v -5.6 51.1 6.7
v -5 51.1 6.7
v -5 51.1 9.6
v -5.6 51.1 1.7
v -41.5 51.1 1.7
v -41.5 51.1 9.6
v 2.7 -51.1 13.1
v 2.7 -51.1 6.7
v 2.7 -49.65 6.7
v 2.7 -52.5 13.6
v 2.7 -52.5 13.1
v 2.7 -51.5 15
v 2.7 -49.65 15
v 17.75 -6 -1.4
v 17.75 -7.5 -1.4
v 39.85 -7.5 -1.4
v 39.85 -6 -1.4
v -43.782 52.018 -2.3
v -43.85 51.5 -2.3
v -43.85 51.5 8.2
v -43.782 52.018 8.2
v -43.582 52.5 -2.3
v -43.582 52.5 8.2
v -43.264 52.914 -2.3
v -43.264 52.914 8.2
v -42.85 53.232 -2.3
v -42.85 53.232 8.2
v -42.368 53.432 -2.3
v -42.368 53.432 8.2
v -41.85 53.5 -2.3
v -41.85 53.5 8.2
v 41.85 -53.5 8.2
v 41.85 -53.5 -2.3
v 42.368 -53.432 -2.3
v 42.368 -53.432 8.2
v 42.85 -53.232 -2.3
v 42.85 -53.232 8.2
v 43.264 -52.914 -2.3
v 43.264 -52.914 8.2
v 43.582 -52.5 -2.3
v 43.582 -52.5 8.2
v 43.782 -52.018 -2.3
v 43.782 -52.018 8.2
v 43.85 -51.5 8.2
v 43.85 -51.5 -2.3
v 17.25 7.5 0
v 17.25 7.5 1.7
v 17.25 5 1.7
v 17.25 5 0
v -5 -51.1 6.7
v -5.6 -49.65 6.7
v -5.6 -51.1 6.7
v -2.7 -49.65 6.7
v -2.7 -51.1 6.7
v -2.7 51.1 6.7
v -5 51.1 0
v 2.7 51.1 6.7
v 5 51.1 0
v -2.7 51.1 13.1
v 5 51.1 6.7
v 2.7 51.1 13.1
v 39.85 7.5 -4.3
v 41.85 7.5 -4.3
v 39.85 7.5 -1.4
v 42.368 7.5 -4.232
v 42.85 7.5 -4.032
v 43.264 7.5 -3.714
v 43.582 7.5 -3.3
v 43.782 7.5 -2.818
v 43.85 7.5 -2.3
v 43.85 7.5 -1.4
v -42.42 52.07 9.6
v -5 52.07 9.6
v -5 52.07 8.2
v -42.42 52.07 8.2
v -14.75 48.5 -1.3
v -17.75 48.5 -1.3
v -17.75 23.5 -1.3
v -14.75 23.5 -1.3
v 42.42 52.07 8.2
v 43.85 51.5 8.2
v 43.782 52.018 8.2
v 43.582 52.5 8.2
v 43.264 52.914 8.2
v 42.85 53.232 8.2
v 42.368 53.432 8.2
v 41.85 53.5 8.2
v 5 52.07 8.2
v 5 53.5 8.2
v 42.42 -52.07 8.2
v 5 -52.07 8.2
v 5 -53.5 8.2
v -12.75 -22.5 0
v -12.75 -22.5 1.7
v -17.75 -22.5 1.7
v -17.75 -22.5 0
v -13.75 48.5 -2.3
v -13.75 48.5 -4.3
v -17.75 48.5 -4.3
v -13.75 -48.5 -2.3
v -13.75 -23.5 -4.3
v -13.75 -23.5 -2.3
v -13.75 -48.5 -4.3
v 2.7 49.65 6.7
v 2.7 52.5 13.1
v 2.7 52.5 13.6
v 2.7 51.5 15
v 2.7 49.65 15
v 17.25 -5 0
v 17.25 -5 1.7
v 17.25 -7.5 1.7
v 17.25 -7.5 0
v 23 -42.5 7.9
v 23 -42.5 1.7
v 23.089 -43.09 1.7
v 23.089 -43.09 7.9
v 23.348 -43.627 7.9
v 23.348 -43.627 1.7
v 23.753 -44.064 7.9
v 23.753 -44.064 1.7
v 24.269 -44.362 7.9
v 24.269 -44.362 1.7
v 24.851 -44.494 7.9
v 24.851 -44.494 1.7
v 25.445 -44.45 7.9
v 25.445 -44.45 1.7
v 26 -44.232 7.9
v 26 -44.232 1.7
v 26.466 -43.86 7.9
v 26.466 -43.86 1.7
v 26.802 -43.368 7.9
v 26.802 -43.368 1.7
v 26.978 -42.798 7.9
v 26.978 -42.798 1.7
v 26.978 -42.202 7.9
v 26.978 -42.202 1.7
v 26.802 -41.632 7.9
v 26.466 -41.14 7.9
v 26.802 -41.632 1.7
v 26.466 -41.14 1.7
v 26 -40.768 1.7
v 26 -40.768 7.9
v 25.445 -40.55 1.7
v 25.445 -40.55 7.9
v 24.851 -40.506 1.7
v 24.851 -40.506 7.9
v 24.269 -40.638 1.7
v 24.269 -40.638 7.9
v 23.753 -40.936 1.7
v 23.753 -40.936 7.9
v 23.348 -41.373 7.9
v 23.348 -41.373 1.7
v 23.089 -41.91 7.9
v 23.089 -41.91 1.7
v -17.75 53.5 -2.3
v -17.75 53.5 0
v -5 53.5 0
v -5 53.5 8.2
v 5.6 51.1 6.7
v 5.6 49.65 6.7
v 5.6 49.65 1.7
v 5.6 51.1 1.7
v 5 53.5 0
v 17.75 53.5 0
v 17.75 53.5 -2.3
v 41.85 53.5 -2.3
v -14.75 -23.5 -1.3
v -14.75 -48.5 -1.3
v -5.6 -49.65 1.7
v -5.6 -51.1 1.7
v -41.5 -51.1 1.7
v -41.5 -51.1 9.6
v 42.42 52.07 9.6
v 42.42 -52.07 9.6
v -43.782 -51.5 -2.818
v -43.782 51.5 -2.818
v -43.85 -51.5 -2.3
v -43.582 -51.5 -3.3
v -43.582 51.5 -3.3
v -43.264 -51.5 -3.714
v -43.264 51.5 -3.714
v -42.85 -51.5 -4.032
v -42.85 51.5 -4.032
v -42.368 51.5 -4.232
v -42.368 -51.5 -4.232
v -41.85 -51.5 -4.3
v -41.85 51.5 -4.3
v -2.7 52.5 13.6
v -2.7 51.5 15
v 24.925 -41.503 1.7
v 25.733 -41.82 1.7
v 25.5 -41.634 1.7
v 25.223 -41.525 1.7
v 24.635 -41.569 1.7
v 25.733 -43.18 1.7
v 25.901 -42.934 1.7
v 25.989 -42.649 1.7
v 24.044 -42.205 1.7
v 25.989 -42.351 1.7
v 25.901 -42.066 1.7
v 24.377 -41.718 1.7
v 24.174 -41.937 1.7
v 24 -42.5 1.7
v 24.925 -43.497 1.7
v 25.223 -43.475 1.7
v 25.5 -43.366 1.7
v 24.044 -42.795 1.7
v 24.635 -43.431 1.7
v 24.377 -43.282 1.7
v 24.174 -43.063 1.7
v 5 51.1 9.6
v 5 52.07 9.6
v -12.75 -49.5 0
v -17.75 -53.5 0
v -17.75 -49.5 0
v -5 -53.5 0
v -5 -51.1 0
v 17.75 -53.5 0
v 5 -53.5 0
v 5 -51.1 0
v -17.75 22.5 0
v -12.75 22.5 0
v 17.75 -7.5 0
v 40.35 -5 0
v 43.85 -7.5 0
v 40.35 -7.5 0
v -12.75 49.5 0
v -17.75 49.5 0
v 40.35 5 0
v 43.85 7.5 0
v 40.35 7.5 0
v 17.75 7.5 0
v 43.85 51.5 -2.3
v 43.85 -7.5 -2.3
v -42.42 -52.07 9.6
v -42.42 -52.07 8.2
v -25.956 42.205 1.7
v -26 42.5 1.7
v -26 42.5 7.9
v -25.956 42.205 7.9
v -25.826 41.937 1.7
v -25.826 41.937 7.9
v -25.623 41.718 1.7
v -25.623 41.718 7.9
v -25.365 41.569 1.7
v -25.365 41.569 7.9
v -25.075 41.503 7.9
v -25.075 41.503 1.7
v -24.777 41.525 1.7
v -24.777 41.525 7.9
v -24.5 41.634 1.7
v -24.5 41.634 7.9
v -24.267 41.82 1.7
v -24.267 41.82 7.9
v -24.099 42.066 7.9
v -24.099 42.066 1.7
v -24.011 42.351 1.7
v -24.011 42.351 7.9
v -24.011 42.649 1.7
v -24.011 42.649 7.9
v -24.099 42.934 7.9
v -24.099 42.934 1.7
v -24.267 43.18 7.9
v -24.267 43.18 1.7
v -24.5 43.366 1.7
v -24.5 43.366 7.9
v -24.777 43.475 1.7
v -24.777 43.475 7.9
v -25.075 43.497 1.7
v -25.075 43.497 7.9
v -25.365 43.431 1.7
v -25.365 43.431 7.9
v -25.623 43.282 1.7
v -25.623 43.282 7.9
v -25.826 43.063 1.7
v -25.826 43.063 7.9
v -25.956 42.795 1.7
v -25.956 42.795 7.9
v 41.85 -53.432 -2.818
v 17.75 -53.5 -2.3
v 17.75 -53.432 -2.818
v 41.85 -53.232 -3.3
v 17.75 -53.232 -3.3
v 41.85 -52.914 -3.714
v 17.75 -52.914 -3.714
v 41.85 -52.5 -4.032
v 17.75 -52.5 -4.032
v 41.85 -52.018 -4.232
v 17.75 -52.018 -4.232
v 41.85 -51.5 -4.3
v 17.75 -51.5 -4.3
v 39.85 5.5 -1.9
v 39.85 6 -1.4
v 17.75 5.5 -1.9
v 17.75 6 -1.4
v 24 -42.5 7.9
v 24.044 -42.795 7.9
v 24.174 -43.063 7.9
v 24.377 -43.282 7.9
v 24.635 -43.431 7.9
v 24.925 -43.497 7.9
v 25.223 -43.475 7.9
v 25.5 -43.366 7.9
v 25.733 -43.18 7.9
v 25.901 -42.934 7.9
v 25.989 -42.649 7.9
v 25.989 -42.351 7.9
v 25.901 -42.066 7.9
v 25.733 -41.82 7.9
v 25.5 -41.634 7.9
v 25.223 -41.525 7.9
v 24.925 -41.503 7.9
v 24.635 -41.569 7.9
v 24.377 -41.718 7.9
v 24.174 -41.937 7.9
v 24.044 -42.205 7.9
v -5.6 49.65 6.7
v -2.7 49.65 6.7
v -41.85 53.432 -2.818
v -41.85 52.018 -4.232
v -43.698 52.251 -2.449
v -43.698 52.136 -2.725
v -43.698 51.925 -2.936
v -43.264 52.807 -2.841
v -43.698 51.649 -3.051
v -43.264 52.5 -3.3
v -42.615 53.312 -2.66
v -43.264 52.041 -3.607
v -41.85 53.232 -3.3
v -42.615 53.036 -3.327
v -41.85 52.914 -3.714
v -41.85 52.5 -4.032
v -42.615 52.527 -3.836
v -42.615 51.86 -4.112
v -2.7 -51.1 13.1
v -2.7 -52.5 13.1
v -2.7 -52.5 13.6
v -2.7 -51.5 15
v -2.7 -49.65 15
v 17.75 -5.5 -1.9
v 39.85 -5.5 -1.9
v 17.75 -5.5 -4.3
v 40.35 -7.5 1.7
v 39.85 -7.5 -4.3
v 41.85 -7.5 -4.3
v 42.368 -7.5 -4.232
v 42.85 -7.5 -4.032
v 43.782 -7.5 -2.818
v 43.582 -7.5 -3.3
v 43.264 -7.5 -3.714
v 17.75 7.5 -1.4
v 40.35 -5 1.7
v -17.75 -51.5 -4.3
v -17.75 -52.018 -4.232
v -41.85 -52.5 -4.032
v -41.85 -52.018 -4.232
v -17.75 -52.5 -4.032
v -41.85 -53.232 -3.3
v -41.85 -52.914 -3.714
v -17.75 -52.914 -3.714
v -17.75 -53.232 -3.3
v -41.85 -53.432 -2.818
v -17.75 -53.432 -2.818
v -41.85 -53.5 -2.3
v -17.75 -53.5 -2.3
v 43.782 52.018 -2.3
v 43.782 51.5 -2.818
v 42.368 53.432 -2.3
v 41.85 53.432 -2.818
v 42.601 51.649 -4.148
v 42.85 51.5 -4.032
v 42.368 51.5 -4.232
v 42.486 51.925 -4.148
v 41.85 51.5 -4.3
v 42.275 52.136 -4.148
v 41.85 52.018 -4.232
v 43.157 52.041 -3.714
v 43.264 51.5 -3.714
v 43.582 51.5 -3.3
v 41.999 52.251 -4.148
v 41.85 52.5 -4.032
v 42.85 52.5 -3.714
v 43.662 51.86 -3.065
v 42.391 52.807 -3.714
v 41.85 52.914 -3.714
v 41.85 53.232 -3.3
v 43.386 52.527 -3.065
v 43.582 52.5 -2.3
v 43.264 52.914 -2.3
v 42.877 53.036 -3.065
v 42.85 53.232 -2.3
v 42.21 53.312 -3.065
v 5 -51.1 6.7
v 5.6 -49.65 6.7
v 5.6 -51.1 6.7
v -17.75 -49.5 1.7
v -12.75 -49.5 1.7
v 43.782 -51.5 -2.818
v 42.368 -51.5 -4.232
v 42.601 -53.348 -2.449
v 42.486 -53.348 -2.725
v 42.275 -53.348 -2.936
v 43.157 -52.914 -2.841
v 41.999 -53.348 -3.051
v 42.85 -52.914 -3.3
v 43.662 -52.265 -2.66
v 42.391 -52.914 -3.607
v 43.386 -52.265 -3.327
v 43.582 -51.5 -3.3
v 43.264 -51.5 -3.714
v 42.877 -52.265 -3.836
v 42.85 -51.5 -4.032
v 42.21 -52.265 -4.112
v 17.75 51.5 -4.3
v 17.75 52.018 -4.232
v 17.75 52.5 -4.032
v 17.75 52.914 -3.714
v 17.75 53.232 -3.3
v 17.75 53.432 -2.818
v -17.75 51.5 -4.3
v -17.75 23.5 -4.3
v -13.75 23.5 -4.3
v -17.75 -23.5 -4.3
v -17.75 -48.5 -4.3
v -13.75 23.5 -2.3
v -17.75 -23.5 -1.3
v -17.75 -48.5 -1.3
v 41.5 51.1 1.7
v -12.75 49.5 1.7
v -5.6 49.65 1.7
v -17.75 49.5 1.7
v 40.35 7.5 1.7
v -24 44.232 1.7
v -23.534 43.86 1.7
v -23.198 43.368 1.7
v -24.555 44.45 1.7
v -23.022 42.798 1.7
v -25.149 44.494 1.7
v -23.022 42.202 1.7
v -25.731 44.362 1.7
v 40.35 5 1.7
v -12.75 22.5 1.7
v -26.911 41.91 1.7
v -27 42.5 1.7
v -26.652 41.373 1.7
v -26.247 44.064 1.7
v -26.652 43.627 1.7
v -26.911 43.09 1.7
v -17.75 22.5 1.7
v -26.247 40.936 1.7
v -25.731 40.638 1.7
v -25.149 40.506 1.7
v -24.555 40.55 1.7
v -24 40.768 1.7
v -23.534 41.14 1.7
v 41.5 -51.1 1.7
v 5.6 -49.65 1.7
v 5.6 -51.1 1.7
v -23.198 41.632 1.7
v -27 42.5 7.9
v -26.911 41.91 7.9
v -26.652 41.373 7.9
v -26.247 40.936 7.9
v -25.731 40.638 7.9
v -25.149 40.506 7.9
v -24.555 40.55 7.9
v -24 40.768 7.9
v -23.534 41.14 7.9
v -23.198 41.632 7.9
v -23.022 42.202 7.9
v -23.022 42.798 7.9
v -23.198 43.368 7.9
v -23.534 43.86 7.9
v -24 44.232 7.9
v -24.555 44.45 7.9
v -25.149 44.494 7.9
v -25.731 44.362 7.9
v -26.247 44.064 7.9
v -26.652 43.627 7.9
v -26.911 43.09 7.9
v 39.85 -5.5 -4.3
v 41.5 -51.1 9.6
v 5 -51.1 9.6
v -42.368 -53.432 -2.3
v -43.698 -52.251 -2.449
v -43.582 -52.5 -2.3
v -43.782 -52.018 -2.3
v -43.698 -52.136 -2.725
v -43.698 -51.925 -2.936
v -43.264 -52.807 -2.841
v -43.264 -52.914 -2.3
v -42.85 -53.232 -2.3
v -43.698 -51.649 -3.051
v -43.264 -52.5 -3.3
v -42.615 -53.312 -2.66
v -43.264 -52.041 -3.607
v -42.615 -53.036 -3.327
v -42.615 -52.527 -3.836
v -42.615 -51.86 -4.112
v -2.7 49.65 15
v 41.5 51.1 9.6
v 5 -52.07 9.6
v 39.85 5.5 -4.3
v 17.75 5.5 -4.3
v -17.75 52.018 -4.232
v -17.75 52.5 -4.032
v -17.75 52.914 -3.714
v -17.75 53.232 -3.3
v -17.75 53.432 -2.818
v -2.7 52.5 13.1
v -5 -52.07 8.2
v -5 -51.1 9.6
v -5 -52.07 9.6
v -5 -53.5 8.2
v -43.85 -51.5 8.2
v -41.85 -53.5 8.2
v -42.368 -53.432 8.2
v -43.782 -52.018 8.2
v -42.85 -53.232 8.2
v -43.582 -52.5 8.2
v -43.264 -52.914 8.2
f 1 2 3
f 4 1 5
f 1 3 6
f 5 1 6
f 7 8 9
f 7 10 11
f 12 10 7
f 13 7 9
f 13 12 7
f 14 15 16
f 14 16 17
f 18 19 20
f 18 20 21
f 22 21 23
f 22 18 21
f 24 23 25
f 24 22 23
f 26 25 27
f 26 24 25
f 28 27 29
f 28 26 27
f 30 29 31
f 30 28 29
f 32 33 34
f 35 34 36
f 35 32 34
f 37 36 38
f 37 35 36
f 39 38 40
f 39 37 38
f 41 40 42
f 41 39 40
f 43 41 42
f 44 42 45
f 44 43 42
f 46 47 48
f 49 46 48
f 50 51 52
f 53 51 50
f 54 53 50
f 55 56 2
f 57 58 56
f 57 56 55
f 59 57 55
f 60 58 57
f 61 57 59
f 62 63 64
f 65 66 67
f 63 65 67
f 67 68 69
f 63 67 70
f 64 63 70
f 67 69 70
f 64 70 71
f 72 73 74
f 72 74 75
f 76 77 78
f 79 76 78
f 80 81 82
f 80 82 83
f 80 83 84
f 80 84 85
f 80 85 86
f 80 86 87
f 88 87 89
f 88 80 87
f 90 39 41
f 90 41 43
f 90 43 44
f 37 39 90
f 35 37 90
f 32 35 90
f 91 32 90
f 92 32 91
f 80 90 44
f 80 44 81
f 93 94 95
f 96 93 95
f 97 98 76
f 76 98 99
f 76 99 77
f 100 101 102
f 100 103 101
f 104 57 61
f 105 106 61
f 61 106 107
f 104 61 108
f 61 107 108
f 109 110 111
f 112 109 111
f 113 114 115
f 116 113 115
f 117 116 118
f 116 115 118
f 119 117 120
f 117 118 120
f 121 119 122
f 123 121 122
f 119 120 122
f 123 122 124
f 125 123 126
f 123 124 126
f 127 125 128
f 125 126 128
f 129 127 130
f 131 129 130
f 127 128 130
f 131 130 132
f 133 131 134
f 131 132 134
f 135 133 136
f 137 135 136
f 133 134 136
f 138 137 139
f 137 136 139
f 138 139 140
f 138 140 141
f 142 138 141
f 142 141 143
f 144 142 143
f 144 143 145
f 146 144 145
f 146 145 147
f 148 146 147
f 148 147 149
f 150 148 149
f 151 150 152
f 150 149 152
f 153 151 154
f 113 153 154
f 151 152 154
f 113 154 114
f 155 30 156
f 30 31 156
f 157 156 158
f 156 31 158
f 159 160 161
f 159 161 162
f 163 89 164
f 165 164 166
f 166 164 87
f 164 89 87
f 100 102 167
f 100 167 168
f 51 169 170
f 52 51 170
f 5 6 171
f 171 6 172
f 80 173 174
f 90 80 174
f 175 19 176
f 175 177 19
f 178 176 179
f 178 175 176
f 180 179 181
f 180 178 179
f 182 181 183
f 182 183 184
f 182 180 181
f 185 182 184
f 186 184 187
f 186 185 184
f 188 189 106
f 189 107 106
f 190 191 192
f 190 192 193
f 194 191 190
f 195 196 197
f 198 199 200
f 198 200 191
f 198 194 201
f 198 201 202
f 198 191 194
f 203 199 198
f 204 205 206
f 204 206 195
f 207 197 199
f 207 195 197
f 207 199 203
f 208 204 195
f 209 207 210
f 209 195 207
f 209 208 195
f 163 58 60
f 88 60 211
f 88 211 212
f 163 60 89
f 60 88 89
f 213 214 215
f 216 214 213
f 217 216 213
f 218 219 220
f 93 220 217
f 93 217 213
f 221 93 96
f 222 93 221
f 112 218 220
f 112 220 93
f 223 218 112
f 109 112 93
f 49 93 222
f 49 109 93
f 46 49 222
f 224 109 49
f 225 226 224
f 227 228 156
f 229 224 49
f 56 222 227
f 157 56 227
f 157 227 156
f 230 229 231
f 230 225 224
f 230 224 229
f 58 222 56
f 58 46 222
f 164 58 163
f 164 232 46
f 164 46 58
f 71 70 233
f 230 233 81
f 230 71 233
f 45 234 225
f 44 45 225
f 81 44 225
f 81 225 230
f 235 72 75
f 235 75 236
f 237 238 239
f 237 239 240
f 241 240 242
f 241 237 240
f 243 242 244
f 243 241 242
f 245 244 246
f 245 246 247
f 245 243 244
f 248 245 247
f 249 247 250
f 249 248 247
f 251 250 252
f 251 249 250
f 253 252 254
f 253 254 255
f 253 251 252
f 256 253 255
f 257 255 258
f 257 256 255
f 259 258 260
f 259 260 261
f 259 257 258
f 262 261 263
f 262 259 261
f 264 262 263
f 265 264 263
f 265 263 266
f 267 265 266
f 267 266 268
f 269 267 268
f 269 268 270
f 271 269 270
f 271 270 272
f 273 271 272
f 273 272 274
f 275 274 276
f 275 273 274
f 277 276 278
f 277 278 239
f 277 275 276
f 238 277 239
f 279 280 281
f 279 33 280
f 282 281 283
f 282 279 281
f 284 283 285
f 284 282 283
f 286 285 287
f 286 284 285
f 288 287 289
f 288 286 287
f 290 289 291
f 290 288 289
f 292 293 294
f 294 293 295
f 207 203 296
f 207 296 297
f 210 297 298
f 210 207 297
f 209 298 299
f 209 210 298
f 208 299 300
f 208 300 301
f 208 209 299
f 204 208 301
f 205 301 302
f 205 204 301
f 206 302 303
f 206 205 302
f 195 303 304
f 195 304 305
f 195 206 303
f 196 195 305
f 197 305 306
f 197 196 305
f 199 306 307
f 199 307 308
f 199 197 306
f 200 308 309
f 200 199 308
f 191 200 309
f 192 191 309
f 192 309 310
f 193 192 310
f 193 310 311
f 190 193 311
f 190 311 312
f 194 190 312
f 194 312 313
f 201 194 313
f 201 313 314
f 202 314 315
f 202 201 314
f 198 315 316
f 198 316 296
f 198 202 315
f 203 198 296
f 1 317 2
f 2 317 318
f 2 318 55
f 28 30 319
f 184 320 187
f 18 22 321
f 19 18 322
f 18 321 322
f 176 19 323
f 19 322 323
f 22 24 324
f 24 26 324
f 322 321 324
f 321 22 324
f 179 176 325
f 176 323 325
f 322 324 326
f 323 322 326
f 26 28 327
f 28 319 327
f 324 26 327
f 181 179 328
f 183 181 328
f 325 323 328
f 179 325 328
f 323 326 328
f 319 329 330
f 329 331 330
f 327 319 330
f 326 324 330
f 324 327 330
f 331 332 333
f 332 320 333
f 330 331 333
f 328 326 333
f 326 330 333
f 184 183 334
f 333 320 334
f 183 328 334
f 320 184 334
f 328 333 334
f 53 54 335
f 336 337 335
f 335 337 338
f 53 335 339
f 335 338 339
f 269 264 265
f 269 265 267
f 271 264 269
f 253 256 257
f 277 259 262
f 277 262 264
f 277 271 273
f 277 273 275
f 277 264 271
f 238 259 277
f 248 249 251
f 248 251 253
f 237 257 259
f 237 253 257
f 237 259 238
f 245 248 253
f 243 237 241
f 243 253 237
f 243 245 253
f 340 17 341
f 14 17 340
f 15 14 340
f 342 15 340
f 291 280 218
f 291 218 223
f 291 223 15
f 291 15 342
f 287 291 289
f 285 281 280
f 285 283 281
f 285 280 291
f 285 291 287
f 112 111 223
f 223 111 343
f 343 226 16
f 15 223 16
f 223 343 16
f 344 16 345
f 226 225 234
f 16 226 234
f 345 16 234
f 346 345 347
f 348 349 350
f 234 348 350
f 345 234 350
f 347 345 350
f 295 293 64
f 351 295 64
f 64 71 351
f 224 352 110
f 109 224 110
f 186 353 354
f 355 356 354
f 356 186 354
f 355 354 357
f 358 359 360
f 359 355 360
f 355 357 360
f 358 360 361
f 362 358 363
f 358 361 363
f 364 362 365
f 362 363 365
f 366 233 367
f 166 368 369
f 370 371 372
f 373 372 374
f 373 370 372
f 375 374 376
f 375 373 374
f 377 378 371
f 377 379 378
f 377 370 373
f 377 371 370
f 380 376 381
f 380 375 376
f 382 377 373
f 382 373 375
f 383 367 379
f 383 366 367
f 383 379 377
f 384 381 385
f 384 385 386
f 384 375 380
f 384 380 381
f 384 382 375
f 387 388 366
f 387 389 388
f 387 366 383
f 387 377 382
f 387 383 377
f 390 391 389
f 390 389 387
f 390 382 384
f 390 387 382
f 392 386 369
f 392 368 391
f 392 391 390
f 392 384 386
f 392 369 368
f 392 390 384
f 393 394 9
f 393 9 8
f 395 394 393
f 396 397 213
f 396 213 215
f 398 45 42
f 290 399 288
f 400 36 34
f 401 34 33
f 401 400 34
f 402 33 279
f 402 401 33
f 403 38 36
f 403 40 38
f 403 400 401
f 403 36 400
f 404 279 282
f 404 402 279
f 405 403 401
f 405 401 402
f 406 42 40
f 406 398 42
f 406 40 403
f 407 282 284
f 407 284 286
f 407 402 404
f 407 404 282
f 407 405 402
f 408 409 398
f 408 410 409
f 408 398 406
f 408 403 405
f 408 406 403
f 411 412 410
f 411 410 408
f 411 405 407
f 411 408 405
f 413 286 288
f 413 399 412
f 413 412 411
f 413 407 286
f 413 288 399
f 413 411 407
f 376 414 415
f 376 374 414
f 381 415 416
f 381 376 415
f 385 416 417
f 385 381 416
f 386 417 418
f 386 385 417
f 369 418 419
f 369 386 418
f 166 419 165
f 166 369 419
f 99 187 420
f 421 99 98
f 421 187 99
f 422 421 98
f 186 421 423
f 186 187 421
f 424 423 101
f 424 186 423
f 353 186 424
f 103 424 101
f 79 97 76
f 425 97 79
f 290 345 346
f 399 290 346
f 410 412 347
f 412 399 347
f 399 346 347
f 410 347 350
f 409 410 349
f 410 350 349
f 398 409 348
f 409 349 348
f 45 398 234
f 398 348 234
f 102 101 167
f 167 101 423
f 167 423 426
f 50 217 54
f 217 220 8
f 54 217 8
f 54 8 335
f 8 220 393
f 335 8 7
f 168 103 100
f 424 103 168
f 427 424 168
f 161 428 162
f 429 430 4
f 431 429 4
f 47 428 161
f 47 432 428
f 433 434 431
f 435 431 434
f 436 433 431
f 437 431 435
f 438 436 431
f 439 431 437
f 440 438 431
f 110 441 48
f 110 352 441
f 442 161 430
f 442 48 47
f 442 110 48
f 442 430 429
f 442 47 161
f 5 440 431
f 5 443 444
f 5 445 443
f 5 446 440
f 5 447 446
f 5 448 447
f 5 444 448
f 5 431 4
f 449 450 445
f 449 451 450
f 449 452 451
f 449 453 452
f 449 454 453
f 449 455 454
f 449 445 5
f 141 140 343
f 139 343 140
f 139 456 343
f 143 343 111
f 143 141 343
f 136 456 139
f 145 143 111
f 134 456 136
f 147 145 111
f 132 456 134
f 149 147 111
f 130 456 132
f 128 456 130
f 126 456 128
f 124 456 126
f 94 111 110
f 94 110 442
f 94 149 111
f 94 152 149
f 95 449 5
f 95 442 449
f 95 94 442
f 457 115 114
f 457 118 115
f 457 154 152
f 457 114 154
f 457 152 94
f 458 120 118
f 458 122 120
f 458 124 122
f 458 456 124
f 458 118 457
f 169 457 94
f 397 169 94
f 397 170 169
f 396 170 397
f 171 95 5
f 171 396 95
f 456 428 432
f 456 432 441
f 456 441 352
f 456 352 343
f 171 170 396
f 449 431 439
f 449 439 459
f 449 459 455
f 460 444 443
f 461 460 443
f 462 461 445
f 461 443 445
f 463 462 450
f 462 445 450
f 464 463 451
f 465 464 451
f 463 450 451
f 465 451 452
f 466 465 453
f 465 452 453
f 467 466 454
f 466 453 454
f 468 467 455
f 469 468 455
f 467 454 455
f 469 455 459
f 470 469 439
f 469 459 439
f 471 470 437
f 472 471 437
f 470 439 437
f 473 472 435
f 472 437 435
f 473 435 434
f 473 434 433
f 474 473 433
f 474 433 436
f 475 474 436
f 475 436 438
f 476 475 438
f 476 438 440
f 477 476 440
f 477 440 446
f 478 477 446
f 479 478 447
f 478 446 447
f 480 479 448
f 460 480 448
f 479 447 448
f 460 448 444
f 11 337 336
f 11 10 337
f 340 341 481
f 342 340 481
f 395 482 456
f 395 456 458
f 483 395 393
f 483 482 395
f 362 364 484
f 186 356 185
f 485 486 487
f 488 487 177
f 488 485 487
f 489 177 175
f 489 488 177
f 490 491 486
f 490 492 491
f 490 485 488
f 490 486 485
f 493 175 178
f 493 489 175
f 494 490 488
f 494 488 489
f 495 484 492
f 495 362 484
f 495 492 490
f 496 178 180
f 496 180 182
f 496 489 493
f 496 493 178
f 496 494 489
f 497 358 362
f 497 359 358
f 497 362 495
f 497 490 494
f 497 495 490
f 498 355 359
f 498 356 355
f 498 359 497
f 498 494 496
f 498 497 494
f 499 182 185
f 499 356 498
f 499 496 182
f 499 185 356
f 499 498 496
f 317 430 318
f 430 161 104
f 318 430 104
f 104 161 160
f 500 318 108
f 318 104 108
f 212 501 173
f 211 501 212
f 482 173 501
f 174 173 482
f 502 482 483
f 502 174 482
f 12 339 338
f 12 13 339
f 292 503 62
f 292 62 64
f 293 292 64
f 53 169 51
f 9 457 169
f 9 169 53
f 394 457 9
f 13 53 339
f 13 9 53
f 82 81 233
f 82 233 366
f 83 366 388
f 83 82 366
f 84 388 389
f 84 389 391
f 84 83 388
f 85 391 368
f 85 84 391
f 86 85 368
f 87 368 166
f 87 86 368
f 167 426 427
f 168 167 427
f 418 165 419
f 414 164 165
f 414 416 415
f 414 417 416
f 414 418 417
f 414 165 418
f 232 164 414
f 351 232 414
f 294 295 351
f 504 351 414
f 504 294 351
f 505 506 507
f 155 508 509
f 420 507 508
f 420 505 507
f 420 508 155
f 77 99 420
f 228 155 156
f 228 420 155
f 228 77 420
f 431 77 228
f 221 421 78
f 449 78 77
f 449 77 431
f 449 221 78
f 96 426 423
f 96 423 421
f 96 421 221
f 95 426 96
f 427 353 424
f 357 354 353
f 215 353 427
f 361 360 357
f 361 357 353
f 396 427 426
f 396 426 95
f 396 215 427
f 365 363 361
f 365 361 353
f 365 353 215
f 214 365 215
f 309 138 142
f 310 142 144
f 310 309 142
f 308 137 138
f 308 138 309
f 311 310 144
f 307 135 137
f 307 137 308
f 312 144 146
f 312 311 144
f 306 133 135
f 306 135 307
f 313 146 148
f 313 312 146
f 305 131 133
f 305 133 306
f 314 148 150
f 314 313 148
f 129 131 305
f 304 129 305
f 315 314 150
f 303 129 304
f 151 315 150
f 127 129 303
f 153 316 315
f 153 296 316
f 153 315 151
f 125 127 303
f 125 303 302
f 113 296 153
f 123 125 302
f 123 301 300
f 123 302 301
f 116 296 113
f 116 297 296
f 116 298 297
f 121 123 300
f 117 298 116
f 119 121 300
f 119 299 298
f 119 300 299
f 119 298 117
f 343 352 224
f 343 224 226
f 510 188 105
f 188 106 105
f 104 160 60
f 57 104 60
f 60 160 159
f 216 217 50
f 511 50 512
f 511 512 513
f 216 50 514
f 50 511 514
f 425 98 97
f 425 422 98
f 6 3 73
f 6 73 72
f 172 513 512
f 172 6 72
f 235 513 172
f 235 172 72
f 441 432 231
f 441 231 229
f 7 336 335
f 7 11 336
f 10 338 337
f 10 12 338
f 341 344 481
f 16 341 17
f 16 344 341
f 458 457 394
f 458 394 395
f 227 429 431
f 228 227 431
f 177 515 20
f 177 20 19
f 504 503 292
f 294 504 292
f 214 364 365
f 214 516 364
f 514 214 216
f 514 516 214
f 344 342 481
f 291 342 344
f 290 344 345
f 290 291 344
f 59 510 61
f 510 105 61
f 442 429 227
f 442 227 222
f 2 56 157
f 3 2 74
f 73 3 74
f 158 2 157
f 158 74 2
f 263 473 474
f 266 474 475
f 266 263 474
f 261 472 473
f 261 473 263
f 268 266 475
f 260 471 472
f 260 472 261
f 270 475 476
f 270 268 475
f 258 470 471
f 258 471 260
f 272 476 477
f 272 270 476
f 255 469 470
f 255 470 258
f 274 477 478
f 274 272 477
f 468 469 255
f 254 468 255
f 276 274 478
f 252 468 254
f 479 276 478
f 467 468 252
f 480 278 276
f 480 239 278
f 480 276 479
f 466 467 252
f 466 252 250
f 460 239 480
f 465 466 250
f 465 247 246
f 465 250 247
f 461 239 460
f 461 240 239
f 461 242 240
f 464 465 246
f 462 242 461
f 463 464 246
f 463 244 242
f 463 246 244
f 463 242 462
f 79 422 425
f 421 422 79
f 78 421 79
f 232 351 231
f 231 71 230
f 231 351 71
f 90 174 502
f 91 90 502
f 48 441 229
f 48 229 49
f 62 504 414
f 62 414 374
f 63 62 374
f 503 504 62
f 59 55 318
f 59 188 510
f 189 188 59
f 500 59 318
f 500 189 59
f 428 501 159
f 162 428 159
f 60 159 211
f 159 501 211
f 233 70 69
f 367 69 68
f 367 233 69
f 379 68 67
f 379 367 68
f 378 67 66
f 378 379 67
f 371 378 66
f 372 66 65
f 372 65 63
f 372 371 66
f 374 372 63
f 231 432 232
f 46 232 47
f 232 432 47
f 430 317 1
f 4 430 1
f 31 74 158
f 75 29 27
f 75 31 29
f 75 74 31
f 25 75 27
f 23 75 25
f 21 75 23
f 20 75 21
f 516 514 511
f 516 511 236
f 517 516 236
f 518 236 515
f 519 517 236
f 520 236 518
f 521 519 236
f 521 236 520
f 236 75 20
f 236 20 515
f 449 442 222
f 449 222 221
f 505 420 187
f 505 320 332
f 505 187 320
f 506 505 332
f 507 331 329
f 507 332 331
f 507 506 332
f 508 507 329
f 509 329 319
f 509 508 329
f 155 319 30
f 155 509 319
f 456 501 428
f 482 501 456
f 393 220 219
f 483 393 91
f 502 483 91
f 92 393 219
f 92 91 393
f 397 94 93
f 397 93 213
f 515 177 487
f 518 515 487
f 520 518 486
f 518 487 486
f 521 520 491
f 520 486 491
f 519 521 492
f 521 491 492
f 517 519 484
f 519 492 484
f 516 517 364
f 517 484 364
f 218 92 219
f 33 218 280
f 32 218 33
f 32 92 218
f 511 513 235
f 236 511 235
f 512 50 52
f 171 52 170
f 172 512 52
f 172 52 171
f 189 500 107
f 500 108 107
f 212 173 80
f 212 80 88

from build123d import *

# Parameters (mm, degrees)
PAD002_DEPTH    = 53.5
SKETCH009_W     = 83
SKETCH009_H     = 102.2
POCKET005_DEPTH = 7.9
SKETCH010_R     = 2
SKETCH010_R_2   = 1
PAD003_DEPTH    = 6.2
SKETCH011_W     = 3
SKETCH011_H     = 25
PAD004_DEPTH    = 4
CHAMFER001_SIZE = 1
POCKET006_DEPTH = 26.1
CHAMFER002_SIZE = 0.5
SKETCH013_W     = 4.3
SKETCH013_H     = 15
POCKET007_DEPTH = 4
SKETCH014_W     = 23.1
SKETCH014_H     = 2.5
SKETCH014_W_2   = 5
SKETCH014_H_2   = 27
POCKET008_DEPTH = 1.7
SKETCH015_W     = 3.85
SKETCH015_H     = 13.9
POCKET009_DEPTH = 5
PAD005_DEPTH    = 2.7
SKETCH017_W     = 1.45
SKETCH017_H     = 6.7
PAD006_DEPTH    = 5.6
FILLET002_R     = 2
SKETCH018_W     = 87.7
SKETCH018_H     = 107
SKETCH018_W_2   = 84.84
SKETCH018_H_2   = 104.14
POCKET010_DEPTH = 1.4


with BuildPart() as part:
    # Sketch008 → Pad002 (new body, symmetric)
    with BuildSketch(Plane.XZ):
        Polygon((43.85, 9.6), (-43.85, 9.6), (-43.85, -4.3), (-17.75, -4.3), (-17.75, 0), (17.75, 0), (17.75, -4.3), (43.85, -4.3), align=None)
    extrude(amount=PAD002_DEPTH, both=True)

    # Sketch009 (on Face1 of Pad002) → Pocket005 (cut)
    with BuildSketch(Plane(origin=(0, 0, 9.6), x_dir=(-1, 0, 0), z_dir=(0, 0, 1))):
        Rectangle(SKETCH009_W, SKETCH009_H)
    extrude(amount=-POCKET005_DEPTH, mode=Mode.SUBTRACT)

    # Sketch010 (on Face15 of Pocket005) → Pad003 (join)
    with BuildSketch(Plane(origin=(0, 0, 1.7), x_dir=(-1, 0, 0), z_dir=(0, 0, 1))):
        with Locations((25, -42.5)):
            Circle(SKETCH010_R)
        with Locations((25, -42.5)):
            Circle(SKETCH010_R_2, mode=Mode.SUBTRACT)
        with Locations((-25, 42.5)):
            Circle(SKETCH010_R)
        with Locations((-25, 42.5)):
            Circle(SKETCH010_R_2, mode=Mode.SUBTRACT)
    extrude(amount=PAD003_DEPTH)

    # Sketch011 (on Face12 of Pad003) → Pad004 (join)
    with BuildSketch(Plane(origin=(-17.75, 0, 0), x_dir=(0, 0, 1), z_dir=(1, 0, 0))):
        with Locations((-2.8, -36)):
            Rectangle(SKETCH011_W, SKETCH011_H)
        with Locations((-2.8, 36)):
            Rectangle(SKETCH011_W, SKETCH011_H)
    extrude(amount=PAD004_DEPTH)

    # Chamfer001
    chamfer001_edges = [part.edges().sort_by_distance(p)[0] for p in [
        (-13.75, 36, -1.3),
        (-13.75, -36, -1.3),
    ]]
    chamfer(chamfer001_edges, length=CHAMFER001_SIZE)

    # Sketch012 (on Face19 of Chamfer001) → Pocket006 (cut)
    with BuildSketch(Plane(origin=(43.85, 0, 0), x_dir=(0, 0, 1), z_dir=(1, 0, 0))):
        Polygon((0, 7.5), (-1.4, 7.5), (-1.4, 5.5), (-6.4, 5.5), (-6.4, -5.5), (-1.4, -5.5), (-1.4, -7.500011), (0, -7.5), align=None)
    extrude(amount=-POCKET006_DEPTH, mode=Mode.SUBTRACT)

    # Chamfer002
    chamfer002_edges = [part.edges().sort_by_distance(p)[0] for p in [
        (30.8, -5.5, -1.4),
        (30.8, 5.5, -1.4),
    ]]
    chamfer(chamfer002_edges, length=CHAMFER002_SIZE)

    # Sketch013 (on Face9 of Chamfer002) → Pocket007 (cut)
    with BuildSketch(Plane(origin=(43.85, 0, 0), x_dir=(0, 0, 1), z_dir=(1, 0, 0))):
        with Locations((-2.15, 0)):
            Rectangle(SKETCH013_W, SKETCH013_H)
    extrude(amount=-POCKET007_DEPTH, mode=Mode.SUBTRACT)

    # Sketch014 (on Face33 of Pocket007) → Pocket008 (cut)
    with BuildSketch(Plane(origin=(0, 0, 1.7), x_dir=(-1, 0, 0), z_dir=(0, 0, 1))):
        with Locations((-28.8, -6.25)):
            Rectangle(SKETCH014_W, SKETCH014_H)
        with Locations((15.25, -36)):
            Rectangle(SKETCH014_W_2, SKETCH014_H_2)
        with Locations((-28.8, 6.25)):
            Rectangle(SKETCH014_W, SKETCH014_H)
        with Locations((15.25, 36)):
            Rectangle(SKETCH014_W_2, SKETCH014_H_2)
    extrude(amount=-POCKET008_DEPTH, mode=Mode.SUBTRACT)

    # Sketch015 → Pocket009 (cut, symmetric)
    with BuildSketch(Plane.YZ):
        with Locations((51.575, 2.65)):
            Rectangle(SKETCH015_W, SKETCH015_H)
    pocket009 = extrude(amount=POCKET009_DEPTH, both=True, mode=Mode.SUBTRACT)

    # Sketch016 → Pad005 (join, symmetric)
    with BuildSketch(Plane.YZ):
        Polygon((49.65, 0), (49.65, 15), (51.5, 15), (52.5, 13.6), (52.5, 13.1), (51.1, 13.1), (51.1, 0), align=None)
    pad005 = extrude(amount=PAD005_DEPTH, both=True)

    # Sketch017 → Pad006 (join, symmetric)
    with BuildSketch(Plane.YZ):
        with Locations((50.375, 3.35)):
            Rectangle(SKETCH017_W, SKETCH017_H)
    pad006 = extrude(amount=PAD006_DEPTH, both=True)

    # Mirrored003: Pocket009, Pad005, Pad006 across XZ
    add(pocket009.mirror(Plane.XZ), mode=Mode.SUBTRACT)
    add(pad005.mirror(Plane.XZ))
    add(pad006.mirror(Plane.XZ))

    # Fillet002
    fillet002_edges = [part.edges().sort_by_distance(p)[0] for p in [
        (43.85, 53.5, 2.65),
        (43.85, 30.5, -4.3),
        (30.8, 53.5, -4.3),
        (-30.8, 53.5, -4.3),
        (-43.85, 53.5, 2.65),
        (43.85, -30.5, -4.3),
        (43.85, -53.5, 2.65),
        (30.8, -53.5, -4.3),
        (-30.8, -53.5, -4.3),
        (-43.85, -53.5, 2.65),
        (-43.85, 0, -4.3),
    ]]
    fillet(fillet002_edges, radius=FILLET002_R)

    # Sketch018 (on Face71 of Fillet002) → Pocket010 (cut)
    with BuildSketch(Plane(origin=(0, 0, 9.6), x_dir=(-1, 0, 0), z_dir=(0, 0, 1))):
        Rectangle(SKETCH018_W, SKETCH018_H)
        Rectangle(SKETCH018_W_2, SKETCH018_H_2, mode=Mode.SUBTRACT)
    extrude(amount=-POCKET010_DEPTH, mode=Mode.SUBTRACT)


solid = part.part
